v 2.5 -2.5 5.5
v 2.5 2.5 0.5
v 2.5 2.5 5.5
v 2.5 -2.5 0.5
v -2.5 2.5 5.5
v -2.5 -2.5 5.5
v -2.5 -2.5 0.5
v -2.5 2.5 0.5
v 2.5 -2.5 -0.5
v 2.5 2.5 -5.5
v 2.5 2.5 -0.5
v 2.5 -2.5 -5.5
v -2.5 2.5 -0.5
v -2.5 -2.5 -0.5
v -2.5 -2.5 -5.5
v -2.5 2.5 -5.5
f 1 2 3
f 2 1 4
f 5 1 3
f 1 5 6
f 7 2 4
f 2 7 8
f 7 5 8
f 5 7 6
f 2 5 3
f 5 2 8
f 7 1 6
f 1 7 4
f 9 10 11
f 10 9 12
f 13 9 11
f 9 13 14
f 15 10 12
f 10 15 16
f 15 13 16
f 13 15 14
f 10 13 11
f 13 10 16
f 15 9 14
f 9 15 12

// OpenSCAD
//echo(5+10-3);
/*
%cube([20,3,10], center =  true);
cube(size = 8, center =  true);
*/

var = 0;
next = var+3;
other = "this is a string";
bool = true;

echo(var / next);
echo(other);

rotate([0,0,var*3]){
translate([var,0,next])
cube(size = 5, center  = bool);


translate([-var,0,-next])
cube(size = 5, center  = bool);
}
